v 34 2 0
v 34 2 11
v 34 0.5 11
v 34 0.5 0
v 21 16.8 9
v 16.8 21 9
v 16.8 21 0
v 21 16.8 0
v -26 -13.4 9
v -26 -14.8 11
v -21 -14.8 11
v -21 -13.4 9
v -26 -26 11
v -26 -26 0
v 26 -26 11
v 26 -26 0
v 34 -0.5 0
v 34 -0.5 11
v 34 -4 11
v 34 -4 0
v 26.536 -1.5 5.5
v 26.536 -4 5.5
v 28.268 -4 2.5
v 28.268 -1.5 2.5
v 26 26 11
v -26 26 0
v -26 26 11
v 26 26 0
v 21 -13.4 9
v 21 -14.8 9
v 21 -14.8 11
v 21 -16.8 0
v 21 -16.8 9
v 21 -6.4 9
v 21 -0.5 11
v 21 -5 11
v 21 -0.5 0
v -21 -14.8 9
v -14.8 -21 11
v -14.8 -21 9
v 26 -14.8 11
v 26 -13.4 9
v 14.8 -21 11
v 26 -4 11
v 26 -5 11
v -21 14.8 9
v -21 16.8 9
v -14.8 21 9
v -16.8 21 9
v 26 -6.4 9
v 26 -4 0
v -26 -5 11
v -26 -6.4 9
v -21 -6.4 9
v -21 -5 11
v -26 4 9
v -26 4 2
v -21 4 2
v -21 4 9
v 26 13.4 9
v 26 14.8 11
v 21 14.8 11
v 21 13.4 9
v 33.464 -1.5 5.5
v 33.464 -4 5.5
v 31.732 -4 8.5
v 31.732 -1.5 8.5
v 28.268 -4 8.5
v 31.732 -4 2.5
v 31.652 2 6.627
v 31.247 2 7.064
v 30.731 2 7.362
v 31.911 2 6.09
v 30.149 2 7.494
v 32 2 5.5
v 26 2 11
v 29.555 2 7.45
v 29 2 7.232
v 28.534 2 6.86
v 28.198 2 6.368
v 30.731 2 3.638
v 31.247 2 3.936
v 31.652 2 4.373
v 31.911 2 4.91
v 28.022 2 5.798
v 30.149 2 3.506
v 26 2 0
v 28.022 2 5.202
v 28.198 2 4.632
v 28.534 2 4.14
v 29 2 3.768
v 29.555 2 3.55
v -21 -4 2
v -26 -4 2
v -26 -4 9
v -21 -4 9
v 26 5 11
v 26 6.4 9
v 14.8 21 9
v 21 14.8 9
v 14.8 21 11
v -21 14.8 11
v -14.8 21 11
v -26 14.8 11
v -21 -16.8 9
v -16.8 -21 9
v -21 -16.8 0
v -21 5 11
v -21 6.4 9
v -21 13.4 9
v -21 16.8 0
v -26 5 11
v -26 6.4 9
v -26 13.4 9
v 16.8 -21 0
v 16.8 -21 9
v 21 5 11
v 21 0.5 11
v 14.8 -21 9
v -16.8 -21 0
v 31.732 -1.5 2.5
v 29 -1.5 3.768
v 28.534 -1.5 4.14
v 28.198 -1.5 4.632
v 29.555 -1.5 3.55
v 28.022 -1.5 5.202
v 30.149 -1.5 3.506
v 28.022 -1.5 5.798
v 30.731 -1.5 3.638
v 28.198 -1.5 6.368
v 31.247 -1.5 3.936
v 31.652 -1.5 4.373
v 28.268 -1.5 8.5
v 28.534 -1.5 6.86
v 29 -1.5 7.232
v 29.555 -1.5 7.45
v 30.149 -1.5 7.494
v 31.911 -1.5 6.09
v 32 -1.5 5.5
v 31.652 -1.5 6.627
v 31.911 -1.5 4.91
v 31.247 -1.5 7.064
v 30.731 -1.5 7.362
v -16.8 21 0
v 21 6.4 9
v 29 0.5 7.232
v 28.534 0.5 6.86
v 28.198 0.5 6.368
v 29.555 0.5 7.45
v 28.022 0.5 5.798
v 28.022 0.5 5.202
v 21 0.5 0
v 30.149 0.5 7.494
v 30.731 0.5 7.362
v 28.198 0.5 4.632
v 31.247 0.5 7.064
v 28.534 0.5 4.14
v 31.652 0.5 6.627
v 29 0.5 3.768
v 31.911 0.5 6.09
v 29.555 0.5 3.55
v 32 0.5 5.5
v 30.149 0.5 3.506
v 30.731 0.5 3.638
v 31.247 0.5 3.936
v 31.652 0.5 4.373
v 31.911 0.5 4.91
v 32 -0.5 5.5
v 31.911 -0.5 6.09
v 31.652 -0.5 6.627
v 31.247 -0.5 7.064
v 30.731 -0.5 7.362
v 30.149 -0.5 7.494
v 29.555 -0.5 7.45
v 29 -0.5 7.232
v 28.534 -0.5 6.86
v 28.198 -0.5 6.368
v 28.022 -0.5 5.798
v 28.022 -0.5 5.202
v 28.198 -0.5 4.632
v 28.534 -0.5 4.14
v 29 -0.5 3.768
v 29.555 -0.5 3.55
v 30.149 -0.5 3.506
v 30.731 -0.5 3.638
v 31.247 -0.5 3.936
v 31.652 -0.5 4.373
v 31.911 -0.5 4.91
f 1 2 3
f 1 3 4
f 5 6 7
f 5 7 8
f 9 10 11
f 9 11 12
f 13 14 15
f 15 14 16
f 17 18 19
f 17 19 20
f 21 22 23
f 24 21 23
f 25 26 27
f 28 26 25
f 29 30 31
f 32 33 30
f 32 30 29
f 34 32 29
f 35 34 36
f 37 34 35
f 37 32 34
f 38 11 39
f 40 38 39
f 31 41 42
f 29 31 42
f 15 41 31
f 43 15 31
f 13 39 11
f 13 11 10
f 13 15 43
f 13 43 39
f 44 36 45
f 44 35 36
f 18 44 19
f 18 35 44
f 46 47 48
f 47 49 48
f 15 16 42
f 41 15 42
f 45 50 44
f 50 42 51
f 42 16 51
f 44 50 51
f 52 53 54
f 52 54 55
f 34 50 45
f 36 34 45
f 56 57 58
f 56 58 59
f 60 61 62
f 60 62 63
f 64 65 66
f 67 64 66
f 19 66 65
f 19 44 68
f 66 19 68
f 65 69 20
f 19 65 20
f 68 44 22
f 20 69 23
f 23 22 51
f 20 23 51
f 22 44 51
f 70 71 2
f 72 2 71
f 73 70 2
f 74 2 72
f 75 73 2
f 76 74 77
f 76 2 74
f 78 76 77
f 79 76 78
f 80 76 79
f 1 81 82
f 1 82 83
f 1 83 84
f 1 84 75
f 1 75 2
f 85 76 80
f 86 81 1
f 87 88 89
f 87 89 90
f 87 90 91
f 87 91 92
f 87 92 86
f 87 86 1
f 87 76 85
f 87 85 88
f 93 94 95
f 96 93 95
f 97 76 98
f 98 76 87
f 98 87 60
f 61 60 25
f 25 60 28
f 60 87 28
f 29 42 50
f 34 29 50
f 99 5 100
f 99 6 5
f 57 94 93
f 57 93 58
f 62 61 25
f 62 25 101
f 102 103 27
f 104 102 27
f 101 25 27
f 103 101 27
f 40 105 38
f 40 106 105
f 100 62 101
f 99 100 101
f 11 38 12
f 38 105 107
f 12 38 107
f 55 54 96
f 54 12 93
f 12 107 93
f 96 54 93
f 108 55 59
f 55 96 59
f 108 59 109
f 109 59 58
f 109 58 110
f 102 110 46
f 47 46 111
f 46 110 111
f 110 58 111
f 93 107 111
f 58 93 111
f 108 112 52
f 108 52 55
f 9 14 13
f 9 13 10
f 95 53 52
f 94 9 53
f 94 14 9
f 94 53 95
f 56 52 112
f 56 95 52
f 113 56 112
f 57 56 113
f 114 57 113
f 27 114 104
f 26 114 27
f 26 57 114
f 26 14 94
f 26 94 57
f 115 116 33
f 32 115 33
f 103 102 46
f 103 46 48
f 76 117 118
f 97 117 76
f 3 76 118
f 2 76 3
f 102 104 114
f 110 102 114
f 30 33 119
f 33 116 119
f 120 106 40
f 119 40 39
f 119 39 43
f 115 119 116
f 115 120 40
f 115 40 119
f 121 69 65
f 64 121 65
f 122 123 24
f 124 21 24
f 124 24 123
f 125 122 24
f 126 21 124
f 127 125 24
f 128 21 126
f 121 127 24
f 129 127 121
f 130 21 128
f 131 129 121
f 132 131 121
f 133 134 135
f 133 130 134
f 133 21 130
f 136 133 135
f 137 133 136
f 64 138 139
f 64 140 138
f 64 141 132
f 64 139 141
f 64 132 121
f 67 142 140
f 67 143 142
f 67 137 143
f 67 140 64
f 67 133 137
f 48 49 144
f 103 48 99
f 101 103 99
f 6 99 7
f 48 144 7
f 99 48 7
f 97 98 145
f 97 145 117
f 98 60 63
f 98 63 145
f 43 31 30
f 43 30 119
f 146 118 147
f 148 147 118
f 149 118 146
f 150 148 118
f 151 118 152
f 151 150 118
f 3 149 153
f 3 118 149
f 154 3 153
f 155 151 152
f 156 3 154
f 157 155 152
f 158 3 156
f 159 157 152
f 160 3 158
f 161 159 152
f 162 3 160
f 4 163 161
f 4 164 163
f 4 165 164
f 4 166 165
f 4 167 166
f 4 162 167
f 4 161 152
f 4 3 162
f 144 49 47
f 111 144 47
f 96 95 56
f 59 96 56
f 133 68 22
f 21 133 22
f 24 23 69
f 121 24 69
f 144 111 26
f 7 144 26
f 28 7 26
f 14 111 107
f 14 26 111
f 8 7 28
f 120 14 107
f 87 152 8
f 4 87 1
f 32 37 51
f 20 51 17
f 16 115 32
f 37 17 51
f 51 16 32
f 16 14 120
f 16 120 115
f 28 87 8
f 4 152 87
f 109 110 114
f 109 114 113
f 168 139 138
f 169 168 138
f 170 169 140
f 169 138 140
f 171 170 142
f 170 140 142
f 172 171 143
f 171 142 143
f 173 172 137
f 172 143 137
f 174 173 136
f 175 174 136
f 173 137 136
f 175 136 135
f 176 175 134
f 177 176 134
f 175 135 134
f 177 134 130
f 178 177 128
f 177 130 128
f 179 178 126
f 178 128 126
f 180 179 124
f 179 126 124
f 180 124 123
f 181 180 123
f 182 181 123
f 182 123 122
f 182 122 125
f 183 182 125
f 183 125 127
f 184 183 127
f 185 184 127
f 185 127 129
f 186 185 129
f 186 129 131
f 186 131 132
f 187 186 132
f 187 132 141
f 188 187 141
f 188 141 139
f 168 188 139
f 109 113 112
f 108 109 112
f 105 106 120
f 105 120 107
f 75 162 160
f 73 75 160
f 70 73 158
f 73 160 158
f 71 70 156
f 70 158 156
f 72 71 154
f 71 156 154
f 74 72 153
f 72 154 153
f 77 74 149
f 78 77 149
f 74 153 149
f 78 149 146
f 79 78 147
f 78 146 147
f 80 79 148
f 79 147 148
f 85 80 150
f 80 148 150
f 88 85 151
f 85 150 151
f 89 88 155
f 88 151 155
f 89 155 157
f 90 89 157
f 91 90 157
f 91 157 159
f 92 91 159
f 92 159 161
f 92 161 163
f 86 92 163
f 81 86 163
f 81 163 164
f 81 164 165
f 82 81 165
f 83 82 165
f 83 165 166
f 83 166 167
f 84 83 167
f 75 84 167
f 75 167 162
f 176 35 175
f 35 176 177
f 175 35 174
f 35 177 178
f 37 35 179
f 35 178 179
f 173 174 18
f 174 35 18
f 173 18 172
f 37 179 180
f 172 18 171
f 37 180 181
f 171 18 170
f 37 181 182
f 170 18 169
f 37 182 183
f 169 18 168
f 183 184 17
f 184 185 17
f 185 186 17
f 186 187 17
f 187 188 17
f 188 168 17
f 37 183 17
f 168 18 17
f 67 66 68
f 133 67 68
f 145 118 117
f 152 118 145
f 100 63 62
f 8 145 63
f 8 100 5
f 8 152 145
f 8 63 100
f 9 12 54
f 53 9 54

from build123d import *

# Parameters (mm, degrees)
ESQUISSE1_W             = 52
ESQUISSE1_H             = 52
ESQUISSE1_W_2           = 42
ESQUISSE1_H_2           = 42
BOSS_EXTRU_1_DEPTH      = 11
ENL_V_START             = -53
ENL_V_MAT_EXTRU_1_DEPTH = 54
BOSS_EXTRU_2_DEPTH      = 2
BOSS_EXTRU_3_DEPTH      = 9
SYM_TRIE3_COPY_1_DEPTH  = 2
SYM_TRIE3_COPY_2_DEPTH  = 9
ENL_V_MAT_EXTRU_2_REACH = 54
ESQUISSE4_W             = 7
ESQUISSE4_H             = 8
ESQUISSE7_W             = 11
ESQUISSE7_H             = 6
BOSS_EXTRU_4_DEPTH      = 8
ENL_V_MAT_EXTRU_3_REACH = 62
ESQUISSE8_W             = 11
ESQUISSE8_H             = 1
ENL_V_MAT_EXTRU_4_DEPTH = 2.5
ESQUISSE10_R            = 2
ENL_V_MAT_EXTRU_5_DEPTH = 3.5


with BuildPart() as part:
    # Esquisse1 → Boss.-Extru.1 (new body)
    with BuildSketch(Plane.XY):
        Rectangle(ESQUISSE1_W, ESQUISSE1_H)
        Rectangle(ESQUISSE1_W_2, ESQUISSE1_H_2, mode=Mode.SUBTRACT)
    extrude(amount=BOSS_EXTRU_1_DEPTH)

    # Esquisse2 → Enlèv. mat.-Extru.1 (cut)
    with BuildSketch(Plane.ZY.offset(26).offset(ENL_V_START)):
        Polygon((88.428613369, 69.000029358), (11, 14.8), (9, 13.4), (9, 6.4), (11, 5), (88.428613369, -49.200029358), (277.455948436, -49.200029358), (277.455948436, 69.000029358), align=None)
    enl_v_mat_extru_1 = extrude(amount=ENL_V_MAT_EXTRU_1_DEPTH, mode=Mode.SUBTRACT)

    # Symétrie1: Enlèv. mat.-Extru.1 across plane
    add(enl_v_mat_extru_1.mirror(Plane.ZX), mode=Mode.SUBTRACT)

    # Esquisse3 → Boss.-Extru.2 (add)
    with BuildSketch(Plane.XY.offset(11)):
        Polygon((-21, 14.8), (-14.8, 21), (-21, 21), align=None)
    boss_extru_2 = extrude(amount=-BOSS_EXTRU_2_DEPTH)

    # Esquisse6 → Boss.-Extru.3 (add)
    with BuildSketch(Plane(origin=(0, 0, 9), x_dir=(-1, 0, 0), z_dir=(0, 0, -1))):
        Polygon((21, 21), (16.8, 21), (21, 16.8), align=None)
    boss_extru_3 = extrude(amount=BOSS_EXTRU_3_DEPTH)

    # Symétrie2: Boss.-Extru.2, Boss.-Extru.3 across plane
    add(boss_extru_2.mirror(Plane(origin=(0, 0, 0), x_dir=(0, 0, 1), z_dir=(1, 0, 0))))
    add(boss_extru_3.mirror(Plane(origin=(0, 0, 0), x_dir=(0, 0, 1), z_dir=(1, 0, 0))))

    # Symétrie3: Boss.-Extru.2, Boss.-Extru.3 across plane
    add(boss_extru_2.mirror(Plane.ZX))
    add(boss_extru_3.mirror(Plane.ZX))

    # Symétrie3 copy 1 sketch → Symétrie3 copy 1 (add)
    with BuildSketch(Plane(origin=(0, 0, 11), x_dir=(-1, 0, 0), z_dir=(0, 0, 1))):
        Polygon((-21, 14.8), (-14.8, 21), (-21, 21), align=None)
    extrude(amount=-SYM_TRIE3_COPY_1_DEPTH)

    # Symétrie3 copy 2 sketch → Symétrie3 copy 2 (add)
    with BuildSketch(Plane(origin=(0, 0, 9), x_dir=(1, 0, 0), z_dir=(0, 0, -1))):
        Polygon((21, 21), (16.8, 21), (21, 16.8), align=None)
    extrude(amount=SYM_TRIE3_COPY_2_DEPTH)

    # Esquisse4 → Enlèv. mat.-Extru.2 (cut, up to next)
    with BuildSketch(Plane.ZY.offset(26), mode=Mode.PRIVATE) as enl_v_mat_extru_2_sk1:
        with Locations((5.5, 0)):
            Rectangle(ESQUISSE4_W, ESQUISSE4_H)
    enl_v_mat_extru_2_tool1 = extrude(enl_v_mat_extru_2_sk1.sketch, amount=-ENL_V_MAT_EXTRU_2_REACH, mode=Mode.PRIVATE) & part.part
    add(enl_v_mat_extru_2_tool1.solids().sort_by_distance((-26, 0, 5.5))[0], mode=Mode.SUBTRACT)

    # Esquisse7 → Boss.-Extru.4 (add)
    with BuildSketch(Plane(origin=(26, 0, 0), x_dir=(0, 0, -1), z_dir=(1, 0, 0))):
        with Locations((-5.5, -1)):
            Rectangle(ESQUISSE7_W, ESQUISSE7_H)
    extrude(amount=BOSS_EXTRU_4_DEPTH)

    # Esquisse8 → Enlèv. mat.-Extru.3 (cut, up to next)
    with BuildSketch(Plane(origin=(34, 0, 0), x_dir=(0, 0, -1), z_dir=(1, 0, 0)), mode=Mode.PRIVATE) as enl_v_mat_extru_3_sk1:
        with Locations((-5.5, 0)):
            Rectangle(ESQUISSE8_W, ESQUISSE8_H)
    enl_v_mat_extru_3_tool1 = extrude(enl_v_mat_extru_3_sk1.sketch, amount=-ENL_V_MAT_EXTRU_3_REACH, mode=Mode.PRIVATE) & part.part
    add(enl_v_mat_extru_3_tool1.solids().sort_by_distance((34, 0, 5.5))[0], mode=Mode.SUBTRACT)

    # Esquisse9 → Enlèv. mat.-Extru.4 (cut)
    with BuildSketch(Plane.XZ.offset(4)):
        Polygon((33.464101615, 5.5), (31.732050808, 8.5), (28.267949192, 8.5), (26.535898385, 5.5), (28.267949192, 2.5), (31.732050808, 2.5), align=None)
    extrude(amount=-ENL_V_MAT_EXTRU_4_DEPTH, mode=Mode.SUBTRACT)

    # Esquisse10 → Enlèv. mat.-Extru.5 (cut)
    with BuildSketch(Plane.XZ.offset(1.5)):
        with Locations((30, 5.5)):
            Circle(ESQUISSE10_R)
    extrude(amount=-ENL_V_MAT_EXTRU_5_DEPTH, mode=Mode.SUBTRACT)


solid = part.part
